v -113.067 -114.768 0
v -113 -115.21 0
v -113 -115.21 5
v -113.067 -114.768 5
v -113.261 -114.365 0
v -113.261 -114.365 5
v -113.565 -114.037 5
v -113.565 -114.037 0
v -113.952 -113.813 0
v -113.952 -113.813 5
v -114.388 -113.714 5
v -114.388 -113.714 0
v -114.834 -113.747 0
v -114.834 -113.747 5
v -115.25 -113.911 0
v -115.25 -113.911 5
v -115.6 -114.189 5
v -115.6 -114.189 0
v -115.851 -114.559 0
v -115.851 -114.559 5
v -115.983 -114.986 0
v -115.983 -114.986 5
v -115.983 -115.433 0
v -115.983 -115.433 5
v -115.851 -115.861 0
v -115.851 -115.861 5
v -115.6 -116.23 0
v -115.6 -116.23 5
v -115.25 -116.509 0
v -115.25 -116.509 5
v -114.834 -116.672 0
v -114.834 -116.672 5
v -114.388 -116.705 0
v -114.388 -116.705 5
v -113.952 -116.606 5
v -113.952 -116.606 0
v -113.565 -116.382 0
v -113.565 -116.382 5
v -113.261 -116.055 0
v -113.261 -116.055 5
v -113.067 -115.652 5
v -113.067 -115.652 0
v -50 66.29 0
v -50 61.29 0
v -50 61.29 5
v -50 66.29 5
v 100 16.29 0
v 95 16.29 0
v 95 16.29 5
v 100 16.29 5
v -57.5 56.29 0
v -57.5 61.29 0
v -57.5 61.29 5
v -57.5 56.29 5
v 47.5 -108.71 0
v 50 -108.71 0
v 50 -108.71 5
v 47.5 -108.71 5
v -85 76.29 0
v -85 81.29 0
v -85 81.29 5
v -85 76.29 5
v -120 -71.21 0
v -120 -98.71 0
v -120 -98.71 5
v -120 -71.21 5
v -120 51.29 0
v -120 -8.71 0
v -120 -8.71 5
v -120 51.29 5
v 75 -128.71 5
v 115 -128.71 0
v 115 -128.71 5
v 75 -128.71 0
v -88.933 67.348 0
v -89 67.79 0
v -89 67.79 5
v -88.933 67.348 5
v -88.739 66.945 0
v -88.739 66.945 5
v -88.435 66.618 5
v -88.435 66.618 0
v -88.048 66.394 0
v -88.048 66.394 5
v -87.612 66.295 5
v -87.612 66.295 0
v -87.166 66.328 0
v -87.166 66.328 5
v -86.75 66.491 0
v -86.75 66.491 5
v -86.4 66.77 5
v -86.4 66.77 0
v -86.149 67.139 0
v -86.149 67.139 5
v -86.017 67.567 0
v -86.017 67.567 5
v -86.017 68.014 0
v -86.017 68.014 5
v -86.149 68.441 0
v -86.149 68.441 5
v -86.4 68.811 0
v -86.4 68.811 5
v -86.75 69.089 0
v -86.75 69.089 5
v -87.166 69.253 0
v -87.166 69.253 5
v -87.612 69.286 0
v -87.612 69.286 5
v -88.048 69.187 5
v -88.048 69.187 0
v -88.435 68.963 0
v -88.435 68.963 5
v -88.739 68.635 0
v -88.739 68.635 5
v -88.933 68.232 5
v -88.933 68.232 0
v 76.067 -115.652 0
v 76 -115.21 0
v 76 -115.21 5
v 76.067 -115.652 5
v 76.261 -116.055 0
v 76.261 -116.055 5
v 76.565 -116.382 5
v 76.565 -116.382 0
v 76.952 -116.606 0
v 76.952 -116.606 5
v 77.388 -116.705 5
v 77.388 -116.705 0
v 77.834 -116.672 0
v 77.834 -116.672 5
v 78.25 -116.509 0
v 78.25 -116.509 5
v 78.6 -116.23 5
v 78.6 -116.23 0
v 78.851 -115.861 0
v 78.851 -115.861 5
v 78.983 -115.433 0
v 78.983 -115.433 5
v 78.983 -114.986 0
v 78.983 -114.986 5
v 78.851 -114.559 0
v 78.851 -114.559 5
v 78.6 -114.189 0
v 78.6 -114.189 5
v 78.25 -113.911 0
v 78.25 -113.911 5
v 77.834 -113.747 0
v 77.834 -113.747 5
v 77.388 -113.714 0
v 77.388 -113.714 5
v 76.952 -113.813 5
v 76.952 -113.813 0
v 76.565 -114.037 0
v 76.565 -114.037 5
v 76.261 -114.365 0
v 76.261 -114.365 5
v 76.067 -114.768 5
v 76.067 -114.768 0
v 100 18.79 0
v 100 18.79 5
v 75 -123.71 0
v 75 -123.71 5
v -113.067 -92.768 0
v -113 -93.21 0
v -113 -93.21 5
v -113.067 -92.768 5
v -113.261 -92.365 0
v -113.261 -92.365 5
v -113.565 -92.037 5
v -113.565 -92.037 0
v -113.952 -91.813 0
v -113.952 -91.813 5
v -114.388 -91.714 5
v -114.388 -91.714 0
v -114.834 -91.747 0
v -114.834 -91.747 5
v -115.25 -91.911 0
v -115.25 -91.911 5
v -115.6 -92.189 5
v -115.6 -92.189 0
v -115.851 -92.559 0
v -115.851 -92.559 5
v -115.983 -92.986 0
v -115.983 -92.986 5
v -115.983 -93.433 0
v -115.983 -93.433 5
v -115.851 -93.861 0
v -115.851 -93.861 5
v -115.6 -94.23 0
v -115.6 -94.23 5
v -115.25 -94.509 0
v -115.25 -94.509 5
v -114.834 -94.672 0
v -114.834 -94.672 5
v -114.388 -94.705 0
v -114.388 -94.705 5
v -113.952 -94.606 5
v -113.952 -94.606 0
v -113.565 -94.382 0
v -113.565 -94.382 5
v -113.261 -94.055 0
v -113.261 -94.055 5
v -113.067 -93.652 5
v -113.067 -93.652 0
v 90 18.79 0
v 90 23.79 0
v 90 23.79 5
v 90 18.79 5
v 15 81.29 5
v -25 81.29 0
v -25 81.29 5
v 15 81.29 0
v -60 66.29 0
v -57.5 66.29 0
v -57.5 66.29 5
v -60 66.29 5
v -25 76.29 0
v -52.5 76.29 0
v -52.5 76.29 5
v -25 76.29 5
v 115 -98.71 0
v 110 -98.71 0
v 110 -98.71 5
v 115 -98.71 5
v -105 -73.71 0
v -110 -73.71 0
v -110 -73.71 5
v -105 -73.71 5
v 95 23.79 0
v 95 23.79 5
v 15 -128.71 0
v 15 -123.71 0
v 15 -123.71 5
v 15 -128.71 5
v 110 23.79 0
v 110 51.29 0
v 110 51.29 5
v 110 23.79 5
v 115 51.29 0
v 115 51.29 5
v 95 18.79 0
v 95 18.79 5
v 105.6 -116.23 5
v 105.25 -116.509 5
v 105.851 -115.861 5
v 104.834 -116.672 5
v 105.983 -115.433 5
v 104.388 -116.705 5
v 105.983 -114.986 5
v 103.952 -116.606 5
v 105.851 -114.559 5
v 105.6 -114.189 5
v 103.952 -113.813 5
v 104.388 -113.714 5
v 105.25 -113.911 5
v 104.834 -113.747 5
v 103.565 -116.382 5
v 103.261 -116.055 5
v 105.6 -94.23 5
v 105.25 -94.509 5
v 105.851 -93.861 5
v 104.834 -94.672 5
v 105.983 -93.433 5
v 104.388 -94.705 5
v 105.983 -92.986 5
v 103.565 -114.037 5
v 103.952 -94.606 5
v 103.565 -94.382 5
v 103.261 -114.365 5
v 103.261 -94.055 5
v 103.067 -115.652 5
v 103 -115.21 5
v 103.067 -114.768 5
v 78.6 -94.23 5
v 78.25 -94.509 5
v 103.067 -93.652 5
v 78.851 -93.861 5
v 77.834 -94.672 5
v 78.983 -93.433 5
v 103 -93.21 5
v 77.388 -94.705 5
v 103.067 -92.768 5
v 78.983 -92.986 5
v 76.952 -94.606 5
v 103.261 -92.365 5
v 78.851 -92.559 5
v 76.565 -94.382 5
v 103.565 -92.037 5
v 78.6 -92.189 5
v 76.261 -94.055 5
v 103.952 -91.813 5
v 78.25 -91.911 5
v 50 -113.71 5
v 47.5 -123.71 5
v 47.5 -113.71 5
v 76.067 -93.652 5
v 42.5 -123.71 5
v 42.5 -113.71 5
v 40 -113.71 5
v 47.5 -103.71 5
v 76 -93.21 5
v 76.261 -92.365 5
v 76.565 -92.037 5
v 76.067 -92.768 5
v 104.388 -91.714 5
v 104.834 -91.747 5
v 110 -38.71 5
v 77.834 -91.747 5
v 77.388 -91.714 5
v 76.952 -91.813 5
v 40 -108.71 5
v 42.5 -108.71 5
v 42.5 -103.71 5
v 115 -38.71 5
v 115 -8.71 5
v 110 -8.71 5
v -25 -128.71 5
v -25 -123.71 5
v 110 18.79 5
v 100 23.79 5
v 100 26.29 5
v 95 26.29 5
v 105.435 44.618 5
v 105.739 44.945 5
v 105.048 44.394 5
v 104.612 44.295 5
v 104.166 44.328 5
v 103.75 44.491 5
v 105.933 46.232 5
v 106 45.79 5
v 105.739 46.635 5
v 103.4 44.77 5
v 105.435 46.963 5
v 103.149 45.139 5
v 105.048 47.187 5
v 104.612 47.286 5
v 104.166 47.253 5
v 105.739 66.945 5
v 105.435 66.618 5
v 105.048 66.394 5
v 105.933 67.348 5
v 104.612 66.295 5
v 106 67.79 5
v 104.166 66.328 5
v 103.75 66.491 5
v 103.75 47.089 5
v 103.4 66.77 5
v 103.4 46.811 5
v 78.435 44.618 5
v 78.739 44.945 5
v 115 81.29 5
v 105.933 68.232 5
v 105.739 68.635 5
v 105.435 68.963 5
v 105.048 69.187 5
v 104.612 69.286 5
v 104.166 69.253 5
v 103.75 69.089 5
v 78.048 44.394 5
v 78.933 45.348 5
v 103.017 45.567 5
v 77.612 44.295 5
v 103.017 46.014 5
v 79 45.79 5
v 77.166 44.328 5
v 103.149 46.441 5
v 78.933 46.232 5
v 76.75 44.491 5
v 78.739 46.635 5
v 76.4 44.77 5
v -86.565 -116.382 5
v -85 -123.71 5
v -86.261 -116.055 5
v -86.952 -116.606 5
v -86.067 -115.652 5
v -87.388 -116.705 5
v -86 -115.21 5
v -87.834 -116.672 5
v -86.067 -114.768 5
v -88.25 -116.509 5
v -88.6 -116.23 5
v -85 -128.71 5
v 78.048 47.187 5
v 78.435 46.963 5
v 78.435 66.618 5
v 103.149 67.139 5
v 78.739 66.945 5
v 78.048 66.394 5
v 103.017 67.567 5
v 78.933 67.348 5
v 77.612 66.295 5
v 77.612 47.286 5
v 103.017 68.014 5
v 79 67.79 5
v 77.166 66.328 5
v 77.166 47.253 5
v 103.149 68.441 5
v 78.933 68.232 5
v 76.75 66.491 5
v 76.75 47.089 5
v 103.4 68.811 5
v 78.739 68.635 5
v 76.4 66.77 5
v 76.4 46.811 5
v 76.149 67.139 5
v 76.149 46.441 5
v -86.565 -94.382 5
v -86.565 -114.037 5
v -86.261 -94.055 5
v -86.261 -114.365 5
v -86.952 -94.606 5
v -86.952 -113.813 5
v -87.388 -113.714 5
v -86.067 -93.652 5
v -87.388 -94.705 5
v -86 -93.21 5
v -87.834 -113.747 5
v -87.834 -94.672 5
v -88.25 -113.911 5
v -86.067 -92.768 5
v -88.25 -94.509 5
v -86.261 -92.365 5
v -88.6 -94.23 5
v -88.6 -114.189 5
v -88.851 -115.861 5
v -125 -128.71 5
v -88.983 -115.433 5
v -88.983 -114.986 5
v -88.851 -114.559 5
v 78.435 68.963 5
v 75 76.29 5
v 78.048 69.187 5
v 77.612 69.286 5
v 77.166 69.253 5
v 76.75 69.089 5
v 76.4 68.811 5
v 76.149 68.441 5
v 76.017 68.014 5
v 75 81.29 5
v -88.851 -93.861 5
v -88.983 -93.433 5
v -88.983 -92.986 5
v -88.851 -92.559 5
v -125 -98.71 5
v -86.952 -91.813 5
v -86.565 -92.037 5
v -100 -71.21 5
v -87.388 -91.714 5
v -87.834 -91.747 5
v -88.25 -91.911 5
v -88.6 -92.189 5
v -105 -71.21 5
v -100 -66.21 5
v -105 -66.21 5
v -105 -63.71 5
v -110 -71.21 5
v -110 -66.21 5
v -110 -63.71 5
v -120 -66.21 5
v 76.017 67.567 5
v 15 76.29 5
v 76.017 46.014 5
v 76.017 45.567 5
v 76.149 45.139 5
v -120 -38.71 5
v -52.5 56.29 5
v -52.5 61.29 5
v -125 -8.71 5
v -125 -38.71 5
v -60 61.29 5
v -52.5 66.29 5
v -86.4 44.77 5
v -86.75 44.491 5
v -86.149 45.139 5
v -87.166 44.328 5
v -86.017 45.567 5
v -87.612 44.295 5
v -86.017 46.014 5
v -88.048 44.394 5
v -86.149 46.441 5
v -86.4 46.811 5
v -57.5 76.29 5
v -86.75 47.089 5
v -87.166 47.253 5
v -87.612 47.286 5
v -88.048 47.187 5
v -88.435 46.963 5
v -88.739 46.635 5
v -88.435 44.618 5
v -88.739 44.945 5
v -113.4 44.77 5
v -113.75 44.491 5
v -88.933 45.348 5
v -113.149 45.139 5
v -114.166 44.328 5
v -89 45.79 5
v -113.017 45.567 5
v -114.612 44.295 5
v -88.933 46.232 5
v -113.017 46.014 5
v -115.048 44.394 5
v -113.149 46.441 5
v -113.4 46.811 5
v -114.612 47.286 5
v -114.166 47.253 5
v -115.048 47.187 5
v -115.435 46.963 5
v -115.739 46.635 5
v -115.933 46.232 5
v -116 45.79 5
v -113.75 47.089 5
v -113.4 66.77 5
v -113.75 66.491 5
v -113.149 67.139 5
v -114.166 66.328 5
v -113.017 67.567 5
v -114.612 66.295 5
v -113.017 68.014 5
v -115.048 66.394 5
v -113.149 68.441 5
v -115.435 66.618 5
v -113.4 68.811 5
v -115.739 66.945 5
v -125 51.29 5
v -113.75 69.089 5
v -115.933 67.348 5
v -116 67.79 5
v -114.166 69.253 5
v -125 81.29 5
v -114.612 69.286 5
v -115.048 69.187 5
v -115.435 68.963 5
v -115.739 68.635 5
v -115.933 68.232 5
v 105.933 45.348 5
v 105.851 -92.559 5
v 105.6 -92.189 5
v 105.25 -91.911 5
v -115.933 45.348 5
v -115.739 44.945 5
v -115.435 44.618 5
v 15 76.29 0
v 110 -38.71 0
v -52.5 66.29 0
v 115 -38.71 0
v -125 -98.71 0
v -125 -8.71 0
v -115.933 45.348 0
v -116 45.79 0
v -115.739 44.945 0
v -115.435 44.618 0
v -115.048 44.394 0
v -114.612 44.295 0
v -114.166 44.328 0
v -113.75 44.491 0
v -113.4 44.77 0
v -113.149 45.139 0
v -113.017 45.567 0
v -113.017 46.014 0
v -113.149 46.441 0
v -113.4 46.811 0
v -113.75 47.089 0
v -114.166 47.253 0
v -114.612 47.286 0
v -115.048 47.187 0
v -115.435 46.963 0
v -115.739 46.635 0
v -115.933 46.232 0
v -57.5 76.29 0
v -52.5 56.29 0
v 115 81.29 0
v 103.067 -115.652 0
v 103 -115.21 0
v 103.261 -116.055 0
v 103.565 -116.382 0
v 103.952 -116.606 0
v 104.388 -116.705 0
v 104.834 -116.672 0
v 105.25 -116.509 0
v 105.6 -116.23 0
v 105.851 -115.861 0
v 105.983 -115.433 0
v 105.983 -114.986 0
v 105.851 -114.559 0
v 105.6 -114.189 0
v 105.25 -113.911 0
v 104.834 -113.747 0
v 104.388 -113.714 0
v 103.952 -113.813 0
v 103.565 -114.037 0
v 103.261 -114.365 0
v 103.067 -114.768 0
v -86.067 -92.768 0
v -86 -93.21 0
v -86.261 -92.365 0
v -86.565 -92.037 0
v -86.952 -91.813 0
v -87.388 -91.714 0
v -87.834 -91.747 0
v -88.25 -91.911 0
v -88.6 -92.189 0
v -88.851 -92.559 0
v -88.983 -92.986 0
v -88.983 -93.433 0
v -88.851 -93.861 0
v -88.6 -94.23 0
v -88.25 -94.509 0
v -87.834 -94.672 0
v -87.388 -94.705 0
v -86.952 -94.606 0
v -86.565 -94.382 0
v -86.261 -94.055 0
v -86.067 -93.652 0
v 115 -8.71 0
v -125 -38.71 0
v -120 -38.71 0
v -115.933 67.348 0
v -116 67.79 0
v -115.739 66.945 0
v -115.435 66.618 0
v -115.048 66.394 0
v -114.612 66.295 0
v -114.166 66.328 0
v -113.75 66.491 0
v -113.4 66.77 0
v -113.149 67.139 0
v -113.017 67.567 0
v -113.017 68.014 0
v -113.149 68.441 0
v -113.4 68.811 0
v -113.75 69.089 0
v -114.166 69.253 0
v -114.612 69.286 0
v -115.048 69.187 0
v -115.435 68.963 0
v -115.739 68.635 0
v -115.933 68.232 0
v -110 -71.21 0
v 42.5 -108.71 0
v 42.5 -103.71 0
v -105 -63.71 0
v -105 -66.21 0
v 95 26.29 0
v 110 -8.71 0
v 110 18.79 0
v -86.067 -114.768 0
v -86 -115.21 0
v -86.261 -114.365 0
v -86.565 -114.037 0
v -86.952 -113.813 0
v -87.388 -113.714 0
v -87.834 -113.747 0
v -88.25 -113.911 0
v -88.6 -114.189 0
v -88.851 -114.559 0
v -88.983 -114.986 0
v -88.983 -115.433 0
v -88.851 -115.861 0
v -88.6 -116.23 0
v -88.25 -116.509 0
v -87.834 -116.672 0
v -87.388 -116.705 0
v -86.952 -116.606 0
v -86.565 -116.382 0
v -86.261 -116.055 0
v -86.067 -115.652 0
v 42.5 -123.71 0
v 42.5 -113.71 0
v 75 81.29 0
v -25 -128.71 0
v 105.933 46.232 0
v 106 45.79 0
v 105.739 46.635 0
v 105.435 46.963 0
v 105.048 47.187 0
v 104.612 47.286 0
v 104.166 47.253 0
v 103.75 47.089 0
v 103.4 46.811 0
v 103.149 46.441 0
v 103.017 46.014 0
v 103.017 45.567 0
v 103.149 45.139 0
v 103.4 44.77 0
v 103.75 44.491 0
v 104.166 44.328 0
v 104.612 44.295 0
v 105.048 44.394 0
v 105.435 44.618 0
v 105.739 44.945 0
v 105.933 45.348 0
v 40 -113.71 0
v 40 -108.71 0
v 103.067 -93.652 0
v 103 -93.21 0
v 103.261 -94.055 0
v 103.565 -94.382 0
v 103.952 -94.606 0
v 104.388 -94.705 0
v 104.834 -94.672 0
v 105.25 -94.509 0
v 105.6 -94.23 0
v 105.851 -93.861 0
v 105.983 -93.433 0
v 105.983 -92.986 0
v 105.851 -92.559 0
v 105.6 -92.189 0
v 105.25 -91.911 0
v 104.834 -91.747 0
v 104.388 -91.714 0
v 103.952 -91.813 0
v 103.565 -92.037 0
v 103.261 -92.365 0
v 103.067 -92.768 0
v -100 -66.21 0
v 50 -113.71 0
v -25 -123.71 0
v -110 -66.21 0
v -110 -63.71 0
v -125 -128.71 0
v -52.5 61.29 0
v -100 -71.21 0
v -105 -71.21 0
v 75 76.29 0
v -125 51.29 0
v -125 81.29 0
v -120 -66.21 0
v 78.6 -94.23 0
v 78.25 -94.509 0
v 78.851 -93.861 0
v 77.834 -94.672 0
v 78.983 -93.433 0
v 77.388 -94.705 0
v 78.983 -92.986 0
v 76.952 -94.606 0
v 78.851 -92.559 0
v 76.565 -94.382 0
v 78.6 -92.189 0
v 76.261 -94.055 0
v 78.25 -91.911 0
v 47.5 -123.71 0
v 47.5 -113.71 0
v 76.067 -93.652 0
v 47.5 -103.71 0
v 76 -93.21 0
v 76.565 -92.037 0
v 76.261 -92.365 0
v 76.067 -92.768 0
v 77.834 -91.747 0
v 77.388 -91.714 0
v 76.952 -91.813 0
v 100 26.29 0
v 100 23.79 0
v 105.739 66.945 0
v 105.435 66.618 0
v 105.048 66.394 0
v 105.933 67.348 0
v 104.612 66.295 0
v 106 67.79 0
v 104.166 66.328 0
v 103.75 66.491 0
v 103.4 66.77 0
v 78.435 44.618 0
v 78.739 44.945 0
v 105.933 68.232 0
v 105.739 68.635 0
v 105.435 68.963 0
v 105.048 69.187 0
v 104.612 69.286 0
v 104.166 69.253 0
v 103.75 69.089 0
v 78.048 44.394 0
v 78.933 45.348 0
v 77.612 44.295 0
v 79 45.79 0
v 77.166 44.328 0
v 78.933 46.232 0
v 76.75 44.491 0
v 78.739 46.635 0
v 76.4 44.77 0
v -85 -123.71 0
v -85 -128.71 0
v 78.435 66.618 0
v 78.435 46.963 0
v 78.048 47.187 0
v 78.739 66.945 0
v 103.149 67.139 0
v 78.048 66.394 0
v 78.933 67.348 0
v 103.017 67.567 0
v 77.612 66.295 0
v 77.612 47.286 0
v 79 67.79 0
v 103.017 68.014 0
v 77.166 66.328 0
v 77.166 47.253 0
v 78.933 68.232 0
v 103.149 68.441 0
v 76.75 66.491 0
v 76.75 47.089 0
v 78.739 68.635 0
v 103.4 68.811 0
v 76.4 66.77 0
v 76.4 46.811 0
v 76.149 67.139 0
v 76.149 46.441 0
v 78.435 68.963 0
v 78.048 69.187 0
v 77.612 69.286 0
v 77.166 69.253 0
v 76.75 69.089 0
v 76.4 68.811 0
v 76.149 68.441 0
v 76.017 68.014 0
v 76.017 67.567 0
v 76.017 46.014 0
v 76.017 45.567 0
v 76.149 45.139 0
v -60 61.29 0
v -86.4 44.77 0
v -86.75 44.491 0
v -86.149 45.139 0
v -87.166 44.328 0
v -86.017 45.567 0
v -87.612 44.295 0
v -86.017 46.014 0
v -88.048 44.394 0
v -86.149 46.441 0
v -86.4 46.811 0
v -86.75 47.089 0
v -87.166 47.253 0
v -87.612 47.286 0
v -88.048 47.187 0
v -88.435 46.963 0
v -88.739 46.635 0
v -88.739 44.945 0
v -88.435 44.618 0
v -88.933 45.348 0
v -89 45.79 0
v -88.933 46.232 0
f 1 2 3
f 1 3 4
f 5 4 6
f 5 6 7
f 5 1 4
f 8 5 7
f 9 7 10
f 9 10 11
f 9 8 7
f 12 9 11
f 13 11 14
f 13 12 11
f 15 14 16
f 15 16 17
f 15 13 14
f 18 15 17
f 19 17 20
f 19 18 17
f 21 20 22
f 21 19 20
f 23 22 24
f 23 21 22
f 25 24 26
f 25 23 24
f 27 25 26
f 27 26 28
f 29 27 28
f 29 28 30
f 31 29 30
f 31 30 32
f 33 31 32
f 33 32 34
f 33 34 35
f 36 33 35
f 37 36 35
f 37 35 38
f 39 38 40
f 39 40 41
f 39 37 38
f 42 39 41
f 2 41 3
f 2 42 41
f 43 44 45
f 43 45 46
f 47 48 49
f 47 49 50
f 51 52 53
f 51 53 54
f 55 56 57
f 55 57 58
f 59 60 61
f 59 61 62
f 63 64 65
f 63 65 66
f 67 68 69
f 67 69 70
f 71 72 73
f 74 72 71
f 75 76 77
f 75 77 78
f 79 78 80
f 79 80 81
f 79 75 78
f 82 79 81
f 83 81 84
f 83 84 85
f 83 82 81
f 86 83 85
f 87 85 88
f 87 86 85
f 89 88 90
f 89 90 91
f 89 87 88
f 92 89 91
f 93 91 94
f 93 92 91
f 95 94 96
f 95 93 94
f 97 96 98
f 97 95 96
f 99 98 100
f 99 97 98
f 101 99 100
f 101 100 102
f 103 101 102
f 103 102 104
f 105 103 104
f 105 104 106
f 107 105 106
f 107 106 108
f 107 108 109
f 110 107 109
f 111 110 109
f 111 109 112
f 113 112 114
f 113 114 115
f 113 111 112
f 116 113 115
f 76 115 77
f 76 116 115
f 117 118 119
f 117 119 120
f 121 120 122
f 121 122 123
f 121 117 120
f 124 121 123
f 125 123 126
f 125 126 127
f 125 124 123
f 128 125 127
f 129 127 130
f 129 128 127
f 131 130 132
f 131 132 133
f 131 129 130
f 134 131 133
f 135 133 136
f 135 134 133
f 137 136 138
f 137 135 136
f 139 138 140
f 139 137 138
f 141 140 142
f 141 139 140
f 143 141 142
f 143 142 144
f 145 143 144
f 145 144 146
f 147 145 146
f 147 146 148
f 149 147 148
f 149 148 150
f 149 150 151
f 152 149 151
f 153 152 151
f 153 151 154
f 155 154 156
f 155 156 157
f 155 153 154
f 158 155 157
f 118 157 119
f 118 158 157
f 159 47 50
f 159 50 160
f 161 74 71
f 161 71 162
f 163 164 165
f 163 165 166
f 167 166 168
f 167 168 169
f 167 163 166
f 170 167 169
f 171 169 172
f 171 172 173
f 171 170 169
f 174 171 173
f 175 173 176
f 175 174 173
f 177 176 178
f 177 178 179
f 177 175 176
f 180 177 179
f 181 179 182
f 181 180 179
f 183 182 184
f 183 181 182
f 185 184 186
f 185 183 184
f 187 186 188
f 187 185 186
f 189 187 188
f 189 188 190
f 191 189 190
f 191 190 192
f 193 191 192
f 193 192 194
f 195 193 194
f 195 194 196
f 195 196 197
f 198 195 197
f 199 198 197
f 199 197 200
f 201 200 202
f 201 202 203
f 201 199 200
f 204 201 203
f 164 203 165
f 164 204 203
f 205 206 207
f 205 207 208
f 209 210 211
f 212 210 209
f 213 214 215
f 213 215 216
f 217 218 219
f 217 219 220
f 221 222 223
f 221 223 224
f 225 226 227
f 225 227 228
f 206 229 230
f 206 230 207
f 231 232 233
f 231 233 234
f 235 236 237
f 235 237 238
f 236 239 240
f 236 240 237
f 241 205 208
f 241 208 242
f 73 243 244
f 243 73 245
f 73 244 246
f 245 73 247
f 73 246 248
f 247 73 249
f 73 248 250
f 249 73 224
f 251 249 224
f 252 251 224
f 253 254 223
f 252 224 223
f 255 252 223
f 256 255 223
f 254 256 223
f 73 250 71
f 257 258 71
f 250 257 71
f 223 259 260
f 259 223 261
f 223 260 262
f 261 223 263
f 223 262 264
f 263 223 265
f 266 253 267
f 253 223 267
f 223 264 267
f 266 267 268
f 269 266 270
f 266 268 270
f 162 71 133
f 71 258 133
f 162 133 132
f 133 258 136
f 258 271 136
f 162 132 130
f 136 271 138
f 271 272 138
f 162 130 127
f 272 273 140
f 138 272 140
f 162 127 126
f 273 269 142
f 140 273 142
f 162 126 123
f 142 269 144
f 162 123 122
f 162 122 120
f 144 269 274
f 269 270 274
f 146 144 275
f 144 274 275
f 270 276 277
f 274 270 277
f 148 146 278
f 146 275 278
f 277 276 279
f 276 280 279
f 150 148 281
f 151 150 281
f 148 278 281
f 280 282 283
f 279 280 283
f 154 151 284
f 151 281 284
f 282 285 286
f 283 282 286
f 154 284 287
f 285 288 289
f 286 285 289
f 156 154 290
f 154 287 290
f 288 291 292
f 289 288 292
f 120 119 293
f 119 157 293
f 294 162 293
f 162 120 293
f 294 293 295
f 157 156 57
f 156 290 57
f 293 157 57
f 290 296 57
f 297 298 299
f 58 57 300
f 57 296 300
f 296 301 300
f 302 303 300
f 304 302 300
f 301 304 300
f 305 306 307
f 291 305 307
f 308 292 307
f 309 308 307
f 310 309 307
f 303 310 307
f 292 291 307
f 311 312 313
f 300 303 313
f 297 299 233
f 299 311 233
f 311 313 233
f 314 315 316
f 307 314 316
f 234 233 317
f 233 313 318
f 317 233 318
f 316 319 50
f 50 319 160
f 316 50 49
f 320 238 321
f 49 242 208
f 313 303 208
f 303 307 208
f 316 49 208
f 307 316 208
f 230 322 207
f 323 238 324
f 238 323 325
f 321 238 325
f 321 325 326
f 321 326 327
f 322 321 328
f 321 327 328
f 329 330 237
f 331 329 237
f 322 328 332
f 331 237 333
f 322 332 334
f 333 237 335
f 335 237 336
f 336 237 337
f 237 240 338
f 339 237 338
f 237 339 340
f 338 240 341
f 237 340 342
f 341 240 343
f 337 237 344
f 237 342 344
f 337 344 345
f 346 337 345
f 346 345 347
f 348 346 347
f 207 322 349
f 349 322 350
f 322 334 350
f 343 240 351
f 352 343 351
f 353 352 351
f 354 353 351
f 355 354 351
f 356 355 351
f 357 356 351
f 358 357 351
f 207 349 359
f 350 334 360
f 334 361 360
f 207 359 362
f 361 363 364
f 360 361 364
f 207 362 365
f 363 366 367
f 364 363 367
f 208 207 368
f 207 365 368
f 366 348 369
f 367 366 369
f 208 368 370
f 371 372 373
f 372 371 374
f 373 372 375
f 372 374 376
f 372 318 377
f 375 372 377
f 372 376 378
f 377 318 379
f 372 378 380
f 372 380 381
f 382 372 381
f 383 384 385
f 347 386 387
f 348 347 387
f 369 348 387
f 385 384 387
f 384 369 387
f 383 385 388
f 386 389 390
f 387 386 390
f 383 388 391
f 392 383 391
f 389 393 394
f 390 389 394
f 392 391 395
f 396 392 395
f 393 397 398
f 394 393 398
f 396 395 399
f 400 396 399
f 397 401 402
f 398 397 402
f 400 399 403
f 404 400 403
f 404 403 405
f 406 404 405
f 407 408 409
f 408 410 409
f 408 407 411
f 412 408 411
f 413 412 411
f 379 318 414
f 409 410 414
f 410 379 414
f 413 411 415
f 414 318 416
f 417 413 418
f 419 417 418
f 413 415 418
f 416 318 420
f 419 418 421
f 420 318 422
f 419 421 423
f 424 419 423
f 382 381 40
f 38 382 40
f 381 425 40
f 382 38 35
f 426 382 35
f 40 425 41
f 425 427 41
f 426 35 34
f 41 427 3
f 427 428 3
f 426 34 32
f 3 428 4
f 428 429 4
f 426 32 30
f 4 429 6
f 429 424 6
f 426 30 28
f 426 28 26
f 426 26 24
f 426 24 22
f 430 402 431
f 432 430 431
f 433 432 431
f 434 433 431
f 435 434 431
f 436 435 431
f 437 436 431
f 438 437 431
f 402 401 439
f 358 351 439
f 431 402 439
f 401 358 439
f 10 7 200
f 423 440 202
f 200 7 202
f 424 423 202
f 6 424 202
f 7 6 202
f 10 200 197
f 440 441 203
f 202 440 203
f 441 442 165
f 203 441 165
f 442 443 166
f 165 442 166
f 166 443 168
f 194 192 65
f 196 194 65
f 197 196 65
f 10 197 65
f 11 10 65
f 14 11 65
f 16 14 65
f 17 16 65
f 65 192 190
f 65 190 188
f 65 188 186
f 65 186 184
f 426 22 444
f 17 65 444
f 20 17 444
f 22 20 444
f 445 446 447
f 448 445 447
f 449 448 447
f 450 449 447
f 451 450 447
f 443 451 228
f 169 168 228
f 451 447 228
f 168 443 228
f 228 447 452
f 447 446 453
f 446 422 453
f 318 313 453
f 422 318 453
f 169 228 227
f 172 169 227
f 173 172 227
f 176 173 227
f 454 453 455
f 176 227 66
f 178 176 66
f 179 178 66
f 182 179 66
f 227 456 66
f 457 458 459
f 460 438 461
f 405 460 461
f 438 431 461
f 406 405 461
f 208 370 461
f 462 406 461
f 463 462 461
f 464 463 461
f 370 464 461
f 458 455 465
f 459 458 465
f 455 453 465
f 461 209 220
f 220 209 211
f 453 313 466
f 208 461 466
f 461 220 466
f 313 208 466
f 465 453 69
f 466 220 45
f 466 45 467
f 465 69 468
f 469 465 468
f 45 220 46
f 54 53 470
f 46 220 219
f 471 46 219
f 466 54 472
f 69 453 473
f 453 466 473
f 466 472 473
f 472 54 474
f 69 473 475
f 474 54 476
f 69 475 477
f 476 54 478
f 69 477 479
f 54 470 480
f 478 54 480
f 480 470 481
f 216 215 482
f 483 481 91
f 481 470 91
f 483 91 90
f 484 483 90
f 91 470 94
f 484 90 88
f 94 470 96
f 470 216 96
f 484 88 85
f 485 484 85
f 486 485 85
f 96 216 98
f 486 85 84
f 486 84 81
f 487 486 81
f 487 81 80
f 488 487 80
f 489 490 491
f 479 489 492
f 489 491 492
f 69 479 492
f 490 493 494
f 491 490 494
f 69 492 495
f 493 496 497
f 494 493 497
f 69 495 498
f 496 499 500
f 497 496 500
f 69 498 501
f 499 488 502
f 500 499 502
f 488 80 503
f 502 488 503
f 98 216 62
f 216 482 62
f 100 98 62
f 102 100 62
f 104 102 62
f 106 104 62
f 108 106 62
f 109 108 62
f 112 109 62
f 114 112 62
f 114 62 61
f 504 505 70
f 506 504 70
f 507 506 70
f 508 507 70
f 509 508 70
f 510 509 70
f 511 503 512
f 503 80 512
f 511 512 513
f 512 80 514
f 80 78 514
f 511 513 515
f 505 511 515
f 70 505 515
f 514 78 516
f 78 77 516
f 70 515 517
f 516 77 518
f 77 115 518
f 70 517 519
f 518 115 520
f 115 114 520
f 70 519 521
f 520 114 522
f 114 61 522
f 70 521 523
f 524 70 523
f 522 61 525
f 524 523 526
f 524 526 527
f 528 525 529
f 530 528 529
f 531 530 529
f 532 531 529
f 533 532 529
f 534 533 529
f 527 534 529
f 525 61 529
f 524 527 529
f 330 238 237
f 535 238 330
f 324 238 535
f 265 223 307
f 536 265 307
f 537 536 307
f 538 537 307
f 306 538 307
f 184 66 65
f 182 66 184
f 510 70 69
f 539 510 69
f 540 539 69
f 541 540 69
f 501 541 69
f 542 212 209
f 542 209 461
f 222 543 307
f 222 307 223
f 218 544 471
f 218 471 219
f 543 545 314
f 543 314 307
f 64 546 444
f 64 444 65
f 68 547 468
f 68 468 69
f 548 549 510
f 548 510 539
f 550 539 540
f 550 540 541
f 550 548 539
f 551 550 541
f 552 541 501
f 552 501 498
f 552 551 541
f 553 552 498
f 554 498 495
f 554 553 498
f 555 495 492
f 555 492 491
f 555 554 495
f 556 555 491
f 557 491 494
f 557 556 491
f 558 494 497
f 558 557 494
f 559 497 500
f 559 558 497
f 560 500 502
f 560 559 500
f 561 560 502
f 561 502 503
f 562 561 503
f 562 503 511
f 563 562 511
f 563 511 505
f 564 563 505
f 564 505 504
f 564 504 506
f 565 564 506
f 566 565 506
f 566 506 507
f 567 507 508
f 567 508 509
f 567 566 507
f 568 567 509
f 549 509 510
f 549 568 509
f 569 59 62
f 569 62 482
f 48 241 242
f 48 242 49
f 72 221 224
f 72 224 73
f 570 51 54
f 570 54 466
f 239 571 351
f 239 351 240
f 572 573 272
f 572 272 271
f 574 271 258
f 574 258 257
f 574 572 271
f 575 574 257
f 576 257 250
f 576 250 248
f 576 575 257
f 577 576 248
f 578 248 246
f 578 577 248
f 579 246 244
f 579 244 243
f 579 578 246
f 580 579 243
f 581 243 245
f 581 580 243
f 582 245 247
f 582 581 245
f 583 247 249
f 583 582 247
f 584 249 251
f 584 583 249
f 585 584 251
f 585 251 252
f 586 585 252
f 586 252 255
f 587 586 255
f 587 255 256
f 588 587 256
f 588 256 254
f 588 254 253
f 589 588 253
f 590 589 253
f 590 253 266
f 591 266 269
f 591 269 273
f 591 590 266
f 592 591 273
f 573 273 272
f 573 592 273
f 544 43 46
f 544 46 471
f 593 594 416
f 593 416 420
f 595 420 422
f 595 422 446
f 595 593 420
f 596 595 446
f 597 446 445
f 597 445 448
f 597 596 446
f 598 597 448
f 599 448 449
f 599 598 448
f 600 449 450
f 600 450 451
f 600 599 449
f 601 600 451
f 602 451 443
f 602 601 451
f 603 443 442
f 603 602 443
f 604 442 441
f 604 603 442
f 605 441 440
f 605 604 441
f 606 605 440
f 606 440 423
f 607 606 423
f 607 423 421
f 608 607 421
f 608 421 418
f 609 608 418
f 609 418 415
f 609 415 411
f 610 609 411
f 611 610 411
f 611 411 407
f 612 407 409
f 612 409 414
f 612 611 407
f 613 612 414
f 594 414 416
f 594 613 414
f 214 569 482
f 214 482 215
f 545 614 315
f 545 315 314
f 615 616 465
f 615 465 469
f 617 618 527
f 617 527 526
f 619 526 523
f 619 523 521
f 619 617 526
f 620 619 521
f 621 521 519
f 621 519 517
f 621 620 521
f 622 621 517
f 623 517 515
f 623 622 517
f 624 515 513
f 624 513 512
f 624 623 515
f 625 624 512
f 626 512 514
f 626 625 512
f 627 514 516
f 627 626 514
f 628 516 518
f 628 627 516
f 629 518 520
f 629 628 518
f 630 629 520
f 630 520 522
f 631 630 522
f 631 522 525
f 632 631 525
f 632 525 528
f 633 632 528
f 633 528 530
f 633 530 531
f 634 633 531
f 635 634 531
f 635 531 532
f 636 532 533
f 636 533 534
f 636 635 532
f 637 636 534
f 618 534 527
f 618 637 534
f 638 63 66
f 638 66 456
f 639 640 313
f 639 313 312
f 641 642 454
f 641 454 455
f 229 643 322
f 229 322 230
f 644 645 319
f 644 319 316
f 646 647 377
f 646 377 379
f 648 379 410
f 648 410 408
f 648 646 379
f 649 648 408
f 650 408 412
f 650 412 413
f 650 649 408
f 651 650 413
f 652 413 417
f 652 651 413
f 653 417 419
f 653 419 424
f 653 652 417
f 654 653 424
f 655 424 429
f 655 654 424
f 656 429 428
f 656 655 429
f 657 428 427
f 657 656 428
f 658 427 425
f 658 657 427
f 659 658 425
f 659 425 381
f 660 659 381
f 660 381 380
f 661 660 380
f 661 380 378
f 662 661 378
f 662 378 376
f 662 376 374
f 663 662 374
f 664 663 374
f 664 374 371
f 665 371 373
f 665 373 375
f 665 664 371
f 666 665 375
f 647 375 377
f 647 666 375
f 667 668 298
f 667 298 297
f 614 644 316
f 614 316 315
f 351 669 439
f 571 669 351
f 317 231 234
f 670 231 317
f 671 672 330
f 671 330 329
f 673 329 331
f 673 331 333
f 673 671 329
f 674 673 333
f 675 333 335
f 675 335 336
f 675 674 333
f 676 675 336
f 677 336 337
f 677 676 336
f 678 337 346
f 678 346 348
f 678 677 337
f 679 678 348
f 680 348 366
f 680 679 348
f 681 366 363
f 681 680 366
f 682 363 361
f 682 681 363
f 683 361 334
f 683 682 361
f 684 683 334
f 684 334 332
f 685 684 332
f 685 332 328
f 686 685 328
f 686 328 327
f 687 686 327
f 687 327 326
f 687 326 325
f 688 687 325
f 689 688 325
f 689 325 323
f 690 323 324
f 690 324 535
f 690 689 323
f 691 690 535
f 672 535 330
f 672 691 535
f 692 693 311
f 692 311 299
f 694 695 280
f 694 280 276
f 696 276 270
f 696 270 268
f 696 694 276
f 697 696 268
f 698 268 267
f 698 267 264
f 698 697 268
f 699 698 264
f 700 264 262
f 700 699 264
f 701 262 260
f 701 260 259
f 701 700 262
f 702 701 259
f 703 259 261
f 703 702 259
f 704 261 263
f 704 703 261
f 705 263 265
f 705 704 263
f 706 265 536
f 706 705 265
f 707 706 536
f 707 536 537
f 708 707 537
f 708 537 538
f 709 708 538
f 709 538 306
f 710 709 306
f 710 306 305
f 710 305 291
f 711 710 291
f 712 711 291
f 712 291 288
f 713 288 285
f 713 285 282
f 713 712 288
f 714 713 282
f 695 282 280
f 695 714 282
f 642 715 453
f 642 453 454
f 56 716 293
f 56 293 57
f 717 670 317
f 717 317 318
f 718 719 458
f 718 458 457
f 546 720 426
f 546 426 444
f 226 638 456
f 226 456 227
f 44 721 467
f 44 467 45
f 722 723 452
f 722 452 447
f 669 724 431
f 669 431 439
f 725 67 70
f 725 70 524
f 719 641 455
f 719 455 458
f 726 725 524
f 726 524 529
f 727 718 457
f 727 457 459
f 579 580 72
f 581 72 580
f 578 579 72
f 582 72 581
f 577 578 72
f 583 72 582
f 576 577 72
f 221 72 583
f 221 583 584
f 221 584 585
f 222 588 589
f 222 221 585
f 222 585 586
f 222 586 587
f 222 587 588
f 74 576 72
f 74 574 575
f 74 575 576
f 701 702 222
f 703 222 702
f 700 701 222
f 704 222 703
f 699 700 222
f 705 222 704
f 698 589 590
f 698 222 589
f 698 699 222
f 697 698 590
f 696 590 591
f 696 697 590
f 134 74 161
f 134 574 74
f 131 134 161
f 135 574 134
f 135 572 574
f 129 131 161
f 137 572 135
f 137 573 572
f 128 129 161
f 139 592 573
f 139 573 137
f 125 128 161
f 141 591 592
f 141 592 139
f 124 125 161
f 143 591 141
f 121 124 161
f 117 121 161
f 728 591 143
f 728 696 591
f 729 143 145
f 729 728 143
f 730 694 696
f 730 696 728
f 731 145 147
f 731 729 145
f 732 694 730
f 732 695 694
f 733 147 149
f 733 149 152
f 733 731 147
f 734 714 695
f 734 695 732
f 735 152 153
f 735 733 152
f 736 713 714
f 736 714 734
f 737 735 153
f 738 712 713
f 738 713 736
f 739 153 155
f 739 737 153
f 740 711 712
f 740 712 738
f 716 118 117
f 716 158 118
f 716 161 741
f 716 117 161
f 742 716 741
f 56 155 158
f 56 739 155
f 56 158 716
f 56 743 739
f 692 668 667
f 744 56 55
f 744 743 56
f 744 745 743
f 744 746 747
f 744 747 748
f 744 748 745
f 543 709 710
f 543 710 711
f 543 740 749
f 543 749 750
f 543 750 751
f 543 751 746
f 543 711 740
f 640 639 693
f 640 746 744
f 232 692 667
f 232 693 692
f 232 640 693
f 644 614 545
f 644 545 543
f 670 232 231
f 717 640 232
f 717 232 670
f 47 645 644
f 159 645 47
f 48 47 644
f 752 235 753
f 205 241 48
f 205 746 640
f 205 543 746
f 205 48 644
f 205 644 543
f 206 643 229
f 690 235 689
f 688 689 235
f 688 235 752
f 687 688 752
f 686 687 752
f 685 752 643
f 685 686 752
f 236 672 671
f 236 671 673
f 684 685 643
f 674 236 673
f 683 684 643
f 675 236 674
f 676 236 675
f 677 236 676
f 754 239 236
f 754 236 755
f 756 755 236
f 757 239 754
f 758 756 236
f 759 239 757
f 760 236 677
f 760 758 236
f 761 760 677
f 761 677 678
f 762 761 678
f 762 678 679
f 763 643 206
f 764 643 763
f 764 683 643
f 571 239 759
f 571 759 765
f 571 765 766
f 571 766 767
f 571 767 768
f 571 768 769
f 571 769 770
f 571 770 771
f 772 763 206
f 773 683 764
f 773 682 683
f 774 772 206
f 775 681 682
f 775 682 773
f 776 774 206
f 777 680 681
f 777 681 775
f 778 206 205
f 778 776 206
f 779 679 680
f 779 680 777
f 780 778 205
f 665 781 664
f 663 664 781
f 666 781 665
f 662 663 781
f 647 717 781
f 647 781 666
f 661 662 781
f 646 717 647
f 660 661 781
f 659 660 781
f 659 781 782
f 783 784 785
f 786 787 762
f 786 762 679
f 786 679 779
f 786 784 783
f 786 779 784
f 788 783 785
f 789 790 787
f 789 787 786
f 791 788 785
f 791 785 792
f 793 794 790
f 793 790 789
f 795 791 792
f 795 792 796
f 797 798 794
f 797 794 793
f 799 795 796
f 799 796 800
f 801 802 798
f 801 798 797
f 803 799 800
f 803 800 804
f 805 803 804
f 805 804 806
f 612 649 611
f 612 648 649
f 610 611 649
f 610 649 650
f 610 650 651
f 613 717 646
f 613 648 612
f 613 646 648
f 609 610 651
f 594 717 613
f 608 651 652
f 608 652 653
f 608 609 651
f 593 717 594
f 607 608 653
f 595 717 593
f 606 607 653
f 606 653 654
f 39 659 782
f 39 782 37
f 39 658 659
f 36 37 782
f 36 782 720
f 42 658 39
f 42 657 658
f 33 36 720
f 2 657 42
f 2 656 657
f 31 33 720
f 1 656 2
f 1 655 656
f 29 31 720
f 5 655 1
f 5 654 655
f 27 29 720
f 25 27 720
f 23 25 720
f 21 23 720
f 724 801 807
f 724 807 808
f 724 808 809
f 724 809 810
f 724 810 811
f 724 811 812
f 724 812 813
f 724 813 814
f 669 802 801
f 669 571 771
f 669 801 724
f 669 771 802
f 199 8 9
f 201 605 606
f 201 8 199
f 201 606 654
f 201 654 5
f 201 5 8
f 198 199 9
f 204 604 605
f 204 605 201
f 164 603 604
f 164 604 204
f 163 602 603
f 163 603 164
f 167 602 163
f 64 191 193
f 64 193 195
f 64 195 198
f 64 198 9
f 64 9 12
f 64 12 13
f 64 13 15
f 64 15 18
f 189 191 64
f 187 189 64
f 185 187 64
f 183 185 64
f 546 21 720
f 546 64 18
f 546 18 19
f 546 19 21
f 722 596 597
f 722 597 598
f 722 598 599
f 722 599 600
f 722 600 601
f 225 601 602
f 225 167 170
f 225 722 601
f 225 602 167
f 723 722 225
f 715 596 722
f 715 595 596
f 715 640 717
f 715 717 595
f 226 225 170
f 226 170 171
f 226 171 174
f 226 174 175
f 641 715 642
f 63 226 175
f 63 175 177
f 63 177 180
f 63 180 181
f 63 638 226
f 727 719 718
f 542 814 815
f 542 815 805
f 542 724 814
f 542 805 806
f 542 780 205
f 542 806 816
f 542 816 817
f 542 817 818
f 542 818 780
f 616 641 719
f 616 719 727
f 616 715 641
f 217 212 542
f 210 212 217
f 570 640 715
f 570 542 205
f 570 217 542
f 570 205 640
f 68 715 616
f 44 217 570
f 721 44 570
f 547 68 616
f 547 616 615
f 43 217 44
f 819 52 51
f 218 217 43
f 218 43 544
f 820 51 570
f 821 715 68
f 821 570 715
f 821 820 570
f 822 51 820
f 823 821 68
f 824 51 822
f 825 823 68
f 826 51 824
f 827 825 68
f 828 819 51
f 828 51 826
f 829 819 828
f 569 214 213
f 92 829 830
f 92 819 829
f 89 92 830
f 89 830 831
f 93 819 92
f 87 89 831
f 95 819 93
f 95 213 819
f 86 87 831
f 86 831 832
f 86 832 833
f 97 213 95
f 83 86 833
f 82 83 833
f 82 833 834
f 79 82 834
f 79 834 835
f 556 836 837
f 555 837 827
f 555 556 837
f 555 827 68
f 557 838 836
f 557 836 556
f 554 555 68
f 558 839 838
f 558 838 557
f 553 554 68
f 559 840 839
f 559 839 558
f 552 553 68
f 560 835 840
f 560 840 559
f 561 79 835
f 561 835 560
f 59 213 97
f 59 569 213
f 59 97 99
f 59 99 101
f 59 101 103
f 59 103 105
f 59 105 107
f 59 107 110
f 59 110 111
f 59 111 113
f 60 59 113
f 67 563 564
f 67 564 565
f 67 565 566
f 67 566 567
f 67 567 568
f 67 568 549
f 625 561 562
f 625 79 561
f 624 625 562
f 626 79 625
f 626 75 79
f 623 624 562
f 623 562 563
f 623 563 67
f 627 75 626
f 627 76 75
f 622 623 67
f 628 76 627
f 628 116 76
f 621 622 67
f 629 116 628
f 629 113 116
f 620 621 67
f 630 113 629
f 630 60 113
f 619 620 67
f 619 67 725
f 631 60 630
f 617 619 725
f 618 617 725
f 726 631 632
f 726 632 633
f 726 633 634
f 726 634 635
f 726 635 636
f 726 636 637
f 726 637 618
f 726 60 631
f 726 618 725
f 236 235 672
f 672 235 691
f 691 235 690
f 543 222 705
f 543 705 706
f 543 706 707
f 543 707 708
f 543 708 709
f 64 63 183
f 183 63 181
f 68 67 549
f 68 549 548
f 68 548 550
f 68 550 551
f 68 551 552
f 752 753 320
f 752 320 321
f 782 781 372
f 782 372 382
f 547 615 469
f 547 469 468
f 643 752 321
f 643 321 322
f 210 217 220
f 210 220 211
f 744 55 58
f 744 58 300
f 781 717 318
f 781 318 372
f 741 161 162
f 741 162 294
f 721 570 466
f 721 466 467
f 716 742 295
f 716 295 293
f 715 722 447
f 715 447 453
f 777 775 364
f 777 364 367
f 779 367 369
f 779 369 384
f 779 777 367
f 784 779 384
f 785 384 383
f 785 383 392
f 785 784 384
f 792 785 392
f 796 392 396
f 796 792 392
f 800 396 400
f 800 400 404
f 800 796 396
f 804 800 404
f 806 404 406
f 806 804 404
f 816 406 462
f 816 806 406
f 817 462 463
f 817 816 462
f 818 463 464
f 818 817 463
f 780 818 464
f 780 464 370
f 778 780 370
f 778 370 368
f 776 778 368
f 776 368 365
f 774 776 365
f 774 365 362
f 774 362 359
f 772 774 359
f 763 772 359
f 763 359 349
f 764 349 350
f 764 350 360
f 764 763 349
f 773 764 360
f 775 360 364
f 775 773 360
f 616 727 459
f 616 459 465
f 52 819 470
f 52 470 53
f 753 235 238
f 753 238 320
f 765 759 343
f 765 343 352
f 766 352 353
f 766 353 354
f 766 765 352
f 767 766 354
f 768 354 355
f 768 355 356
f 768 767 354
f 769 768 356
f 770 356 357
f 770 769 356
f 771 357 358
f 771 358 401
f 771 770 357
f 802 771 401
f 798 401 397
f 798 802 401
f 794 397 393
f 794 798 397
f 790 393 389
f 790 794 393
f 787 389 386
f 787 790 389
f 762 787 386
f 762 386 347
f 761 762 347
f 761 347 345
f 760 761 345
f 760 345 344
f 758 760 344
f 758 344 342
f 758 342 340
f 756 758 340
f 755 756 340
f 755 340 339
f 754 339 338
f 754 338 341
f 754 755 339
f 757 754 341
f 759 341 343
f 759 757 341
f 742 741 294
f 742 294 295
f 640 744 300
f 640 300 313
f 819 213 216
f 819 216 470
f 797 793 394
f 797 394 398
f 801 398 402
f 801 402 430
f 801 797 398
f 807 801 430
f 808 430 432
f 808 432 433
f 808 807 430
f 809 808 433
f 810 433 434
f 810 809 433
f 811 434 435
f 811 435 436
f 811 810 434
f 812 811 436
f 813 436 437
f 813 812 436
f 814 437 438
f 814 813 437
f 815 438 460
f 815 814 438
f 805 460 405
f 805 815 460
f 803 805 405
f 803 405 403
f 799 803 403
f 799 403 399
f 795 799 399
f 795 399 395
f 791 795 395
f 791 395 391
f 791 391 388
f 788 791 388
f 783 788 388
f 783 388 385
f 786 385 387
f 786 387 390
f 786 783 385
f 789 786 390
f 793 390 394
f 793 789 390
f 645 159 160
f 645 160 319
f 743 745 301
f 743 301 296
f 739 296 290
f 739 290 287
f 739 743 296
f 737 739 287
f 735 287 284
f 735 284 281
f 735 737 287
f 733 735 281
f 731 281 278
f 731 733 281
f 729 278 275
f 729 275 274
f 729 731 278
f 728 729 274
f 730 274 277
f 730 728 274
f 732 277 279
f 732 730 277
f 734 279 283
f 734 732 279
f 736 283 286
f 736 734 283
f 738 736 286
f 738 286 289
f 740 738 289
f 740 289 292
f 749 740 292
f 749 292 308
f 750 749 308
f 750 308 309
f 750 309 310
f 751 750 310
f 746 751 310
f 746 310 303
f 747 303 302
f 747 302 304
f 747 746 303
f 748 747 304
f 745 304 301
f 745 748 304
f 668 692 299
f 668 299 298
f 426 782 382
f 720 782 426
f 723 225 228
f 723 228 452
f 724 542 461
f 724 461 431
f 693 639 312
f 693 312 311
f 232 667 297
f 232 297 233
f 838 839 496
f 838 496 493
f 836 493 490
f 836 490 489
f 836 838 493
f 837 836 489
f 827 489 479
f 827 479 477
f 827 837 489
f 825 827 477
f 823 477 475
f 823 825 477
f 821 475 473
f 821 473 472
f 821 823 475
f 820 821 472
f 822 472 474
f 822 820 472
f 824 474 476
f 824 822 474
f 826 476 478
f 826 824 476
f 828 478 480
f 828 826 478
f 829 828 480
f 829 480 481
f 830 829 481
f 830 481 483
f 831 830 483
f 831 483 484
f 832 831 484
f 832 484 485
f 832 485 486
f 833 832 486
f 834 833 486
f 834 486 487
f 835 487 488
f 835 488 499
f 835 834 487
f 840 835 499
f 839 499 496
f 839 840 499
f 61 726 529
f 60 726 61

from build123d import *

# Parameters (mm, degrees)
ESQUISSE1_R        = 1.5
BOSS_EXTRU_1_DEPTH = 5


with BuildPart() as part:
    # Esquisse1 → Boss.-Extru.1 (new body)
    with BuildSketch(Plane.XY):
        Polygon((-25, 81.290322581), (15, 81.290322581), (15, 76.290322581), (75, 76.290322581), (75, 81.290322581), (115, 81.290322581), (115, 51.290322581), (110, 51.290322581), (110, 23.790322581), (100, 23.790322581), (100, 26.290322581), (95, 26.290322581), (95, 23.790322581), (90, 23.790322581), (90, 18.790322581), (95, 18.790322581), (95, 16.290322581), (100, 16.290322581), (100, 18.790322581), (110, 18.790322581), (110, -8.709677419), (115, -8.709677419), (115, -38.709677419), (110, -38.709677419), (110, -98.709677419), (115, -98.709677419), (115, -128.709677419), (75, -128.709677419), (75, -123.709677419), (47.5, -123.709677419), (47.5, -113.709677419), (50, -113.709677419), (50, -108.709677419), (47.5, -108.709677419), (47.5, -103.709677419), (42.5, -103.709677419), (42.5, -108.709677419), (40, -108.709677419), (40, -113.709677419), (42.5, -113.709677419), (42.5, -123.709677419), (15, -123.709677419), (15, -128.709677419), (-25, -128.709677419), (-25, -123.709677419), (-85, -123.709677419), (-85, -128.709677419), (-125, -128.709677419), (-125, -98.709677419), (-120, -98.709677419), (-120, -71.209677419), (-110, -71.209677419), (-110, -73.709677419), (-105, -73.709677419), (-105, -71.209677419), (-100, -71.209677419), (-100, -66.209677419), (-105, -66.209677419), (-105, -63.709677419), (-110, -63.709677419), (-110, -66.209677419), (-120, -66.209677419), (-120, -38.709677419), (-125, -38.709677419), (-125, -8.709677419), (-120, -8.709677419), (-120, 51.290322581), (-125, 51.290322581), (-125, 81.290322581), (-85, 81.290322581), (-85, 76.290322581), (-57.5, 76.290322581), (-57.5, 66.290322581), (-60, 66.290322581), (-60, 61.290322581), (-57.5, 61.290322581), (-57.5, 56.290322581), (-52.5, 56.290322581), (-52.5, 61.290322581), (-50, 61.290322581), (-50, 66.290322581), (-52.5, 66.290322581), (-52.5, 76.290322581), (-25, 76.290322581), align=None)
        with Locations((-114.5, -93.209677419)):
            Circle(ESQUISSE1_R, mode=Mode.SUBTRACT)
        with Locations((-114.5, -115.209677419)):
            Circle(ESQUISSE1_R, mode=Mode.SUBTRACT)
        with Locations((-87.5, -115.209677419)):
            Circle(ESQUISSE1_R, mode=Mode.SUBTRACT)
        with Locations((-87.5, -93.209677419)):
            Circle(ESQUISSE1_R, mode=Mode.SUBTRACT)
        with Locations(Location((-87.5, 45.790322581, 0), (0, 0, 180))):
            Circle(ESQUISSE1_R, mode=Mode.SUBTRACT)
        with Locations(Location((-87.5, 67.790322581, 0), (0, 0, 180))):
            Circle(ESQUISSE1_R, mode=Mode.SUBTRACT)
        with Locations(Location((-114.5, 67.790322581, 0), (0, 0, 180))):
            Circle(ESQUISSE1_R, mode=Mode.SUBTRACT)
        with Locations(Location((-114.5, 45.790322581, 0), (0, 0, 180))):
            Circle(ESQUISSE1_R, mode=Mode.SUBTRACT)
        with Locations((104.5, 67.790322581)):
            Circle(ESQUISSE1_R, mode=Mode.SUBTRACT)
        with Locations((104.5, 45.790322581)):
            Circle(ESQUISSE1_R, mode=Mode.SUBTRACT)
        with Locations((77.5, 45.790322581)):
            Circle(ESQUISSE1_R, mode=Mode.SUBTRACT)
        with Locations((77.5, 67.790322581)):
            Circle(ESQUISSE1_R, mode=Mode.SUBTRACT)
        with Locations(Location((104.5, -93.209677419, 0), (0, 0, 180))):
            Circle(ESQUISSE1_R, mode=Mode.SUBTRACT)
        with Locations(Location((104.5, -115.209677419, 0), (0, 0, 180))):
            Circle(ESQUISSE1_R, mode=Mode.SUBTRACT)
        with Locations(Location((77.5, -115.209677419, 0), (0, 0, 180))):
            Circle(ESQUISSE1_R, mode=Mode.SUBTRACT)
        with Locations(Location((77.5, -93.209677419, 0), (0, 0, 180))):
            Circle(ESQUISSE1_R, mode=Mode.SUBTRACT)
    extrude(amount=BOSS_EXTRU_1_DEPTH)


solid = part.part
